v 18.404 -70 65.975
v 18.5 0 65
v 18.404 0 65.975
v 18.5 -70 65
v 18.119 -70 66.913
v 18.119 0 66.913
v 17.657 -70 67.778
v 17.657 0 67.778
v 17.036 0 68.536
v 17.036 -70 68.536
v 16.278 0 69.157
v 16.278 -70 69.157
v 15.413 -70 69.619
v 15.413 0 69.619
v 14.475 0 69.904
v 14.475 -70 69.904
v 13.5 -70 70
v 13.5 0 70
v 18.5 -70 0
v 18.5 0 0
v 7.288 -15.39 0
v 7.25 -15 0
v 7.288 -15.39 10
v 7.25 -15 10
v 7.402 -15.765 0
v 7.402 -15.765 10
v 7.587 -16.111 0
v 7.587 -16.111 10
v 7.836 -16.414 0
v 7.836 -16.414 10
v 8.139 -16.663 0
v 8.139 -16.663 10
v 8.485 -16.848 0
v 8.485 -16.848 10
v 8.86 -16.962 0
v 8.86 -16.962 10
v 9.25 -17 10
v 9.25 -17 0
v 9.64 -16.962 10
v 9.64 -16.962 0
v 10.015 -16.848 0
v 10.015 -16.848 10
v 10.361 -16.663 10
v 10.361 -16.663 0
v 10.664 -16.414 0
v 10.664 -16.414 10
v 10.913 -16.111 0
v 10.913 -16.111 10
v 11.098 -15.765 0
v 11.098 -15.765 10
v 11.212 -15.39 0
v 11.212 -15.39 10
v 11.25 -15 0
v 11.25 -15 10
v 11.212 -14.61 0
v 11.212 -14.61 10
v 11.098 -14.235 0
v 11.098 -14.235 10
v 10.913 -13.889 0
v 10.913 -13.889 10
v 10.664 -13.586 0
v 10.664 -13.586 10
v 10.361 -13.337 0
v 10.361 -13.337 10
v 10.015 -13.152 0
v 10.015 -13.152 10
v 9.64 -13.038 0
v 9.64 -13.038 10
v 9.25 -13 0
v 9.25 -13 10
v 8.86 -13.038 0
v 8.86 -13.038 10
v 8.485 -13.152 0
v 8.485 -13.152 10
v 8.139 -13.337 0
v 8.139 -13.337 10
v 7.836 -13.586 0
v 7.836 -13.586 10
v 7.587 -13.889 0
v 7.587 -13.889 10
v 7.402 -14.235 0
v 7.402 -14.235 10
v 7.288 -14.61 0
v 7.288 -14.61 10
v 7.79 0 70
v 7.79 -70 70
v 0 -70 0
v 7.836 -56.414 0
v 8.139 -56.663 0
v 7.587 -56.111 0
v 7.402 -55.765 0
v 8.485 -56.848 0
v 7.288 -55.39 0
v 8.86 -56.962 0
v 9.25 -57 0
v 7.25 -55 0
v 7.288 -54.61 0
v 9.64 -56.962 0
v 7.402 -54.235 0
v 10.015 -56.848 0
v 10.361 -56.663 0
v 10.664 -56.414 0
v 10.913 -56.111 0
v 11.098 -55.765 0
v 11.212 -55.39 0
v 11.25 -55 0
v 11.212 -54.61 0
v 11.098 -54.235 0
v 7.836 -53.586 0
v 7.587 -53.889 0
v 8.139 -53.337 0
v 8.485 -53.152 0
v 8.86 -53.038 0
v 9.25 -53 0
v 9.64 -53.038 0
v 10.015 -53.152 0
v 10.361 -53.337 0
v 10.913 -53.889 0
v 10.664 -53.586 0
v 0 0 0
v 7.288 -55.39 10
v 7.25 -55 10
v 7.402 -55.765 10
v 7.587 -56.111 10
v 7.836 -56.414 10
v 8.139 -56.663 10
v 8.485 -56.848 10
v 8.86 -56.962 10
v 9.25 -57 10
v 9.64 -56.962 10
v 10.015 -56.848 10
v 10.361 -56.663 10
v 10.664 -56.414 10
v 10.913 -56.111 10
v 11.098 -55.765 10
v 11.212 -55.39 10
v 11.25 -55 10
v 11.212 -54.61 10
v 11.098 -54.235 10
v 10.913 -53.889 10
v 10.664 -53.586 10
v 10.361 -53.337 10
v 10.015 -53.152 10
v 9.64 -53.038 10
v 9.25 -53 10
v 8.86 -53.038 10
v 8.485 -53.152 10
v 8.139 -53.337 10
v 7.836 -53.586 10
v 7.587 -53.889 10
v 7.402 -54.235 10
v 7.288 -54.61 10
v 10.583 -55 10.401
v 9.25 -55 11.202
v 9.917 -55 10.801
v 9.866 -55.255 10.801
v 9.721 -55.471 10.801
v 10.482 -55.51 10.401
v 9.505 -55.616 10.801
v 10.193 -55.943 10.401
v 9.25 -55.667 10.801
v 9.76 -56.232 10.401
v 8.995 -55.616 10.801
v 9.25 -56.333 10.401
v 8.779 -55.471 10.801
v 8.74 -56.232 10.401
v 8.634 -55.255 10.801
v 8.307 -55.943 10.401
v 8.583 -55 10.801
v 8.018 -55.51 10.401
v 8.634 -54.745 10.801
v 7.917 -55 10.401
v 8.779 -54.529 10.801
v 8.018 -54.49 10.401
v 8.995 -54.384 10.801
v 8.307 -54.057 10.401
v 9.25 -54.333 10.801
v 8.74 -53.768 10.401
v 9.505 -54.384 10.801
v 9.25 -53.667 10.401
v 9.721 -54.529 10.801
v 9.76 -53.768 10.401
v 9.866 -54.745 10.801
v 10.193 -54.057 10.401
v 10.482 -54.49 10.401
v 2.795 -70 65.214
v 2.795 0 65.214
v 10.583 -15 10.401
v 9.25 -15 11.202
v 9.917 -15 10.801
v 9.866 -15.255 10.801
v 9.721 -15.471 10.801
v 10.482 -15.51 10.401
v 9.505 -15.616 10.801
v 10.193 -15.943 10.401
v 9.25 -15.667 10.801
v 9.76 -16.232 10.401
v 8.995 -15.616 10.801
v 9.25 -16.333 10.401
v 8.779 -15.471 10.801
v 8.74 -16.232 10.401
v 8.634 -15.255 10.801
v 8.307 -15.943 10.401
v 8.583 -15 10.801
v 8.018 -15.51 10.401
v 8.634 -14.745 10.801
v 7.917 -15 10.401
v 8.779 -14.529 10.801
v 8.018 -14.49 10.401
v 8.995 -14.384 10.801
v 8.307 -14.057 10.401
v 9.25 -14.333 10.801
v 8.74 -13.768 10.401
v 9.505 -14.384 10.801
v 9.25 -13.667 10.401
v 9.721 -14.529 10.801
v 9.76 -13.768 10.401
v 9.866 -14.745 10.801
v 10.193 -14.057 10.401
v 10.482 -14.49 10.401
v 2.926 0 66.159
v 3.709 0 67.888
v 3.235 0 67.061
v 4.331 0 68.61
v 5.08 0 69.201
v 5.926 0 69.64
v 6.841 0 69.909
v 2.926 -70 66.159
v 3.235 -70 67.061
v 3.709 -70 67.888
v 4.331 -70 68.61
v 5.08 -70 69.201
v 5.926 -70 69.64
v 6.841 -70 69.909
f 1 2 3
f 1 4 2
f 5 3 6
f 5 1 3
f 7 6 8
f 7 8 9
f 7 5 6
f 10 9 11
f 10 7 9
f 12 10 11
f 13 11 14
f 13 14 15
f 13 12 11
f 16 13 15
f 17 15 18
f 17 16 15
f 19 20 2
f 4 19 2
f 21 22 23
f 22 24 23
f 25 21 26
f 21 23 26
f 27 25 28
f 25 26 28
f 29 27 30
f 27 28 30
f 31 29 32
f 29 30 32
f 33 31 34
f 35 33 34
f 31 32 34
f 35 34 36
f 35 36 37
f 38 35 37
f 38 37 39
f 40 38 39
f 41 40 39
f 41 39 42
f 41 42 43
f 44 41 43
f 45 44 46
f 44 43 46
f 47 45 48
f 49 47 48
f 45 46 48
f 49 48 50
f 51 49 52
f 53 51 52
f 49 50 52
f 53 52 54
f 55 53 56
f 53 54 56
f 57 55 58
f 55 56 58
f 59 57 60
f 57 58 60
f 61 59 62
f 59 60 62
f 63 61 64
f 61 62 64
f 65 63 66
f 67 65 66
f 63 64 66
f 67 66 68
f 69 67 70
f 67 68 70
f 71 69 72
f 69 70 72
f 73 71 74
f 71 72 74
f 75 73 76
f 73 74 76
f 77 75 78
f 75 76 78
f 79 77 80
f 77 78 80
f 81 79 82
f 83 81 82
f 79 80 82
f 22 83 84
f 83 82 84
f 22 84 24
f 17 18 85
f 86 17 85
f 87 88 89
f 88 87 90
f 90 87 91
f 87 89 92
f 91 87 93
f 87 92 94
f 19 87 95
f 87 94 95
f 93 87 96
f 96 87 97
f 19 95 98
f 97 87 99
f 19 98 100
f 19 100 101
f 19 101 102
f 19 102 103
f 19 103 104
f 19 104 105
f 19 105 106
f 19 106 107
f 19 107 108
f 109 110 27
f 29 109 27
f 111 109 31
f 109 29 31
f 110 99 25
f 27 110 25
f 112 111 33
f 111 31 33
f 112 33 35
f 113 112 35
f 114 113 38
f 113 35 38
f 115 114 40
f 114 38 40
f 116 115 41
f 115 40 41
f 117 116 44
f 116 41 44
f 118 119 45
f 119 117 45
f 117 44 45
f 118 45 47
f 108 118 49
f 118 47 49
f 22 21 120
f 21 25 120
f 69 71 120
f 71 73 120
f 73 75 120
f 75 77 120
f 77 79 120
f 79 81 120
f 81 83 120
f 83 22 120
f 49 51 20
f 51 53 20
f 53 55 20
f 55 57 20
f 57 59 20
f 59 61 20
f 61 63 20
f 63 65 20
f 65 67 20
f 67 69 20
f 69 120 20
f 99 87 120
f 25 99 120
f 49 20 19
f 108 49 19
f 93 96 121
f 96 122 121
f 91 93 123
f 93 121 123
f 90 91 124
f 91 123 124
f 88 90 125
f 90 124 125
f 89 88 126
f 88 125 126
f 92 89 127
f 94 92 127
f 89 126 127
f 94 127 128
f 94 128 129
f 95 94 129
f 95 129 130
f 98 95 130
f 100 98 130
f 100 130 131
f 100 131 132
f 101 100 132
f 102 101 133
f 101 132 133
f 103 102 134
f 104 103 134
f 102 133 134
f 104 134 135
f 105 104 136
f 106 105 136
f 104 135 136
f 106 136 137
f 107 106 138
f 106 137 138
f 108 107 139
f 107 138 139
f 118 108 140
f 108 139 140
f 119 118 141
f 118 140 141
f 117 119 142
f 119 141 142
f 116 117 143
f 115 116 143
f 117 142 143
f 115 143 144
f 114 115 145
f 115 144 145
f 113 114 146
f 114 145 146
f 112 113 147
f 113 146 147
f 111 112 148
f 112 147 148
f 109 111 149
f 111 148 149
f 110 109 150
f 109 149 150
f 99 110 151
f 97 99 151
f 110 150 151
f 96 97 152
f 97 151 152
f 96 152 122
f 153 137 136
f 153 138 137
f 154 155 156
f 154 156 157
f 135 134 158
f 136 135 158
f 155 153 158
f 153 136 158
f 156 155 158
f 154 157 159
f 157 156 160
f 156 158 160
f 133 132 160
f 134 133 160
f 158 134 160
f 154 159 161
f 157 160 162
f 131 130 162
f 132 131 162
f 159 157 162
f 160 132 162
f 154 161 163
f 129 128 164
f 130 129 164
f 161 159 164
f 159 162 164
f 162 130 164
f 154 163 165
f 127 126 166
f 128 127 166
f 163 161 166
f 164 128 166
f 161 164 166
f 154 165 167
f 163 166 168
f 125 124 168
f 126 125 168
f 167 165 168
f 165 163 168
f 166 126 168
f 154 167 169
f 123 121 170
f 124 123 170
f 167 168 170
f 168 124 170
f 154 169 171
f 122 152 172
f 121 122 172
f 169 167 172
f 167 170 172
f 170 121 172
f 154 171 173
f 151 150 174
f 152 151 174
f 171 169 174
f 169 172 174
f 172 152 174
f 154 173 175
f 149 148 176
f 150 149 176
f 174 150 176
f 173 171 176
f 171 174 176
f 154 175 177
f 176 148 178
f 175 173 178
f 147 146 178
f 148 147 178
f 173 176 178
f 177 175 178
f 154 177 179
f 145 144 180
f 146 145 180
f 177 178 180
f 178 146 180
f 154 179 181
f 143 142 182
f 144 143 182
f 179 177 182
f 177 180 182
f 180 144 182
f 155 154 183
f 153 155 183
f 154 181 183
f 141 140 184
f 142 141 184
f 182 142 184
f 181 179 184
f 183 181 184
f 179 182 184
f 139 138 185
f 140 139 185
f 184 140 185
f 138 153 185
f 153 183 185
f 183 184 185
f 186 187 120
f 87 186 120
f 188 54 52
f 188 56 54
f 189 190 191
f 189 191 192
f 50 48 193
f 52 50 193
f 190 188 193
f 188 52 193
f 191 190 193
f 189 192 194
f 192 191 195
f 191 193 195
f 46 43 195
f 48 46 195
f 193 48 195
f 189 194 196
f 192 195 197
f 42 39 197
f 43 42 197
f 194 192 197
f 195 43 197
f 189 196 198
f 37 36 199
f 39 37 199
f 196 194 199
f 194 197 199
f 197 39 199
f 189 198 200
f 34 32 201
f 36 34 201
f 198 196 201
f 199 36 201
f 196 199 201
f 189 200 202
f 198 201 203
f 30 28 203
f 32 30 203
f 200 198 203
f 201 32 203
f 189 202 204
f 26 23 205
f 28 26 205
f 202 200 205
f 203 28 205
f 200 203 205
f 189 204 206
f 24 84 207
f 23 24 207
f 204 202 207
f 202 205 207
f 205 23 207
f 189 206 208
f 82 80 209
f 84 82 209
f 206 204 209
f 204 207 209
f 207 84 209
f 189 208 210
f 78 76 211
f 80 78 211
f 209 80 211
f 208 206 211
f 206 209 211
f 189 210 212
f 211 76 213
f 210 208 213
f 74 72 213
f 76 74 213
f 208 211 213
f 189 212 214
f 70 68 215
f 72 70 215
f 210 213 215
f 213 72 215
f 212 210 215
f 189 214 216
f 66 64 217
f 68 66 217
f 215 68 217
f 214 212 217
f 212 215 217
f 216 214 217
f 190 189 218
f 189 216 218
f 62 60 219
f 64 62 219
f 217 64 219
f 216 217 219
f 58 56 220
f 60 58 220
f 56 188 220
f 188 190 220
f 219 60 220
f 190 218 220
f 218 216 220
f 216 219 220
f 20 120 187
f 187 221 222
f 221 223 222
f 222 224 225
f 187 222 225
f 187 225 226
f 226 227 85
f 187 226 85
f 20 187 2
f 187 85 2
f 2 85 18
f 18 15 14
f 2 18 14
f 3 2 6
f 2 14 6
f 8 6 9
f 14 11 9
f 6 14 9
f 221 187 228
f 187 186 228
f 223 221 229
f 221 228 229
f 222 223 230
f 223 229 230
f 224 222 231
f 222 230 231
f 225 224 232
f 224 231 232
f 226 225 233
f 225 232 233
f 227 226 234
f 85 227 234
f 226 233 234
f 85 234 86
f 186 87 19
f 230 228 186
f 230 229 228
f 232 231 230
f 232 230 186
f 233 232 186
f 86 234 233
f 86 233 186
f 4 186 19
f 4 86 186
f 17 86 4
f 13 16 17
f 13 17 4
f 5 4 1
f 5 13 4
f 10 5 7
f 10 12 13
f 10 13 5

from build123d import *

# Parameters (mm, degrees)
F1_DEPTH = 70
F2_R     = 5
F4_D     = 4
F4_DEPTH = 10
F4_TIP   = 1.2017212381


with BuildPart() as f1:
    # F0 (on Front) → F1 (new body)
    with BuildSketch(Plane.XZ):
        Polygon((3, 70), (0, 0), (18.5, 0), (18.5, 70), align=None)
    extrude(amount=F1_DEPTH)

    # F2
    f2_edges = [f1.edges().sort_by_distance(p)[0] for p in [
        (18.5, -35, 70),
        (3, -35, 70),
    ]]
    fillet(f2_edges, radius=F2_R)

    # F4
    with Locations(Plane(origin=(0, 0, 0), x_dir=(1, 0, 0), z_dir=(0, 0, -1))):
        with Locations((9.25, 55), (9.25, 15)):
            Hole(F4_D / 2, depth=F4_DEPTH)
            with Locations((0, 0, -(F4_DEPTH + F4_TIP / 2))):  # 118° drill point
                Cone(0, F4_D / 2, F4_TIP, mode=Mode.SUBTRACT)


solid = f1.part
